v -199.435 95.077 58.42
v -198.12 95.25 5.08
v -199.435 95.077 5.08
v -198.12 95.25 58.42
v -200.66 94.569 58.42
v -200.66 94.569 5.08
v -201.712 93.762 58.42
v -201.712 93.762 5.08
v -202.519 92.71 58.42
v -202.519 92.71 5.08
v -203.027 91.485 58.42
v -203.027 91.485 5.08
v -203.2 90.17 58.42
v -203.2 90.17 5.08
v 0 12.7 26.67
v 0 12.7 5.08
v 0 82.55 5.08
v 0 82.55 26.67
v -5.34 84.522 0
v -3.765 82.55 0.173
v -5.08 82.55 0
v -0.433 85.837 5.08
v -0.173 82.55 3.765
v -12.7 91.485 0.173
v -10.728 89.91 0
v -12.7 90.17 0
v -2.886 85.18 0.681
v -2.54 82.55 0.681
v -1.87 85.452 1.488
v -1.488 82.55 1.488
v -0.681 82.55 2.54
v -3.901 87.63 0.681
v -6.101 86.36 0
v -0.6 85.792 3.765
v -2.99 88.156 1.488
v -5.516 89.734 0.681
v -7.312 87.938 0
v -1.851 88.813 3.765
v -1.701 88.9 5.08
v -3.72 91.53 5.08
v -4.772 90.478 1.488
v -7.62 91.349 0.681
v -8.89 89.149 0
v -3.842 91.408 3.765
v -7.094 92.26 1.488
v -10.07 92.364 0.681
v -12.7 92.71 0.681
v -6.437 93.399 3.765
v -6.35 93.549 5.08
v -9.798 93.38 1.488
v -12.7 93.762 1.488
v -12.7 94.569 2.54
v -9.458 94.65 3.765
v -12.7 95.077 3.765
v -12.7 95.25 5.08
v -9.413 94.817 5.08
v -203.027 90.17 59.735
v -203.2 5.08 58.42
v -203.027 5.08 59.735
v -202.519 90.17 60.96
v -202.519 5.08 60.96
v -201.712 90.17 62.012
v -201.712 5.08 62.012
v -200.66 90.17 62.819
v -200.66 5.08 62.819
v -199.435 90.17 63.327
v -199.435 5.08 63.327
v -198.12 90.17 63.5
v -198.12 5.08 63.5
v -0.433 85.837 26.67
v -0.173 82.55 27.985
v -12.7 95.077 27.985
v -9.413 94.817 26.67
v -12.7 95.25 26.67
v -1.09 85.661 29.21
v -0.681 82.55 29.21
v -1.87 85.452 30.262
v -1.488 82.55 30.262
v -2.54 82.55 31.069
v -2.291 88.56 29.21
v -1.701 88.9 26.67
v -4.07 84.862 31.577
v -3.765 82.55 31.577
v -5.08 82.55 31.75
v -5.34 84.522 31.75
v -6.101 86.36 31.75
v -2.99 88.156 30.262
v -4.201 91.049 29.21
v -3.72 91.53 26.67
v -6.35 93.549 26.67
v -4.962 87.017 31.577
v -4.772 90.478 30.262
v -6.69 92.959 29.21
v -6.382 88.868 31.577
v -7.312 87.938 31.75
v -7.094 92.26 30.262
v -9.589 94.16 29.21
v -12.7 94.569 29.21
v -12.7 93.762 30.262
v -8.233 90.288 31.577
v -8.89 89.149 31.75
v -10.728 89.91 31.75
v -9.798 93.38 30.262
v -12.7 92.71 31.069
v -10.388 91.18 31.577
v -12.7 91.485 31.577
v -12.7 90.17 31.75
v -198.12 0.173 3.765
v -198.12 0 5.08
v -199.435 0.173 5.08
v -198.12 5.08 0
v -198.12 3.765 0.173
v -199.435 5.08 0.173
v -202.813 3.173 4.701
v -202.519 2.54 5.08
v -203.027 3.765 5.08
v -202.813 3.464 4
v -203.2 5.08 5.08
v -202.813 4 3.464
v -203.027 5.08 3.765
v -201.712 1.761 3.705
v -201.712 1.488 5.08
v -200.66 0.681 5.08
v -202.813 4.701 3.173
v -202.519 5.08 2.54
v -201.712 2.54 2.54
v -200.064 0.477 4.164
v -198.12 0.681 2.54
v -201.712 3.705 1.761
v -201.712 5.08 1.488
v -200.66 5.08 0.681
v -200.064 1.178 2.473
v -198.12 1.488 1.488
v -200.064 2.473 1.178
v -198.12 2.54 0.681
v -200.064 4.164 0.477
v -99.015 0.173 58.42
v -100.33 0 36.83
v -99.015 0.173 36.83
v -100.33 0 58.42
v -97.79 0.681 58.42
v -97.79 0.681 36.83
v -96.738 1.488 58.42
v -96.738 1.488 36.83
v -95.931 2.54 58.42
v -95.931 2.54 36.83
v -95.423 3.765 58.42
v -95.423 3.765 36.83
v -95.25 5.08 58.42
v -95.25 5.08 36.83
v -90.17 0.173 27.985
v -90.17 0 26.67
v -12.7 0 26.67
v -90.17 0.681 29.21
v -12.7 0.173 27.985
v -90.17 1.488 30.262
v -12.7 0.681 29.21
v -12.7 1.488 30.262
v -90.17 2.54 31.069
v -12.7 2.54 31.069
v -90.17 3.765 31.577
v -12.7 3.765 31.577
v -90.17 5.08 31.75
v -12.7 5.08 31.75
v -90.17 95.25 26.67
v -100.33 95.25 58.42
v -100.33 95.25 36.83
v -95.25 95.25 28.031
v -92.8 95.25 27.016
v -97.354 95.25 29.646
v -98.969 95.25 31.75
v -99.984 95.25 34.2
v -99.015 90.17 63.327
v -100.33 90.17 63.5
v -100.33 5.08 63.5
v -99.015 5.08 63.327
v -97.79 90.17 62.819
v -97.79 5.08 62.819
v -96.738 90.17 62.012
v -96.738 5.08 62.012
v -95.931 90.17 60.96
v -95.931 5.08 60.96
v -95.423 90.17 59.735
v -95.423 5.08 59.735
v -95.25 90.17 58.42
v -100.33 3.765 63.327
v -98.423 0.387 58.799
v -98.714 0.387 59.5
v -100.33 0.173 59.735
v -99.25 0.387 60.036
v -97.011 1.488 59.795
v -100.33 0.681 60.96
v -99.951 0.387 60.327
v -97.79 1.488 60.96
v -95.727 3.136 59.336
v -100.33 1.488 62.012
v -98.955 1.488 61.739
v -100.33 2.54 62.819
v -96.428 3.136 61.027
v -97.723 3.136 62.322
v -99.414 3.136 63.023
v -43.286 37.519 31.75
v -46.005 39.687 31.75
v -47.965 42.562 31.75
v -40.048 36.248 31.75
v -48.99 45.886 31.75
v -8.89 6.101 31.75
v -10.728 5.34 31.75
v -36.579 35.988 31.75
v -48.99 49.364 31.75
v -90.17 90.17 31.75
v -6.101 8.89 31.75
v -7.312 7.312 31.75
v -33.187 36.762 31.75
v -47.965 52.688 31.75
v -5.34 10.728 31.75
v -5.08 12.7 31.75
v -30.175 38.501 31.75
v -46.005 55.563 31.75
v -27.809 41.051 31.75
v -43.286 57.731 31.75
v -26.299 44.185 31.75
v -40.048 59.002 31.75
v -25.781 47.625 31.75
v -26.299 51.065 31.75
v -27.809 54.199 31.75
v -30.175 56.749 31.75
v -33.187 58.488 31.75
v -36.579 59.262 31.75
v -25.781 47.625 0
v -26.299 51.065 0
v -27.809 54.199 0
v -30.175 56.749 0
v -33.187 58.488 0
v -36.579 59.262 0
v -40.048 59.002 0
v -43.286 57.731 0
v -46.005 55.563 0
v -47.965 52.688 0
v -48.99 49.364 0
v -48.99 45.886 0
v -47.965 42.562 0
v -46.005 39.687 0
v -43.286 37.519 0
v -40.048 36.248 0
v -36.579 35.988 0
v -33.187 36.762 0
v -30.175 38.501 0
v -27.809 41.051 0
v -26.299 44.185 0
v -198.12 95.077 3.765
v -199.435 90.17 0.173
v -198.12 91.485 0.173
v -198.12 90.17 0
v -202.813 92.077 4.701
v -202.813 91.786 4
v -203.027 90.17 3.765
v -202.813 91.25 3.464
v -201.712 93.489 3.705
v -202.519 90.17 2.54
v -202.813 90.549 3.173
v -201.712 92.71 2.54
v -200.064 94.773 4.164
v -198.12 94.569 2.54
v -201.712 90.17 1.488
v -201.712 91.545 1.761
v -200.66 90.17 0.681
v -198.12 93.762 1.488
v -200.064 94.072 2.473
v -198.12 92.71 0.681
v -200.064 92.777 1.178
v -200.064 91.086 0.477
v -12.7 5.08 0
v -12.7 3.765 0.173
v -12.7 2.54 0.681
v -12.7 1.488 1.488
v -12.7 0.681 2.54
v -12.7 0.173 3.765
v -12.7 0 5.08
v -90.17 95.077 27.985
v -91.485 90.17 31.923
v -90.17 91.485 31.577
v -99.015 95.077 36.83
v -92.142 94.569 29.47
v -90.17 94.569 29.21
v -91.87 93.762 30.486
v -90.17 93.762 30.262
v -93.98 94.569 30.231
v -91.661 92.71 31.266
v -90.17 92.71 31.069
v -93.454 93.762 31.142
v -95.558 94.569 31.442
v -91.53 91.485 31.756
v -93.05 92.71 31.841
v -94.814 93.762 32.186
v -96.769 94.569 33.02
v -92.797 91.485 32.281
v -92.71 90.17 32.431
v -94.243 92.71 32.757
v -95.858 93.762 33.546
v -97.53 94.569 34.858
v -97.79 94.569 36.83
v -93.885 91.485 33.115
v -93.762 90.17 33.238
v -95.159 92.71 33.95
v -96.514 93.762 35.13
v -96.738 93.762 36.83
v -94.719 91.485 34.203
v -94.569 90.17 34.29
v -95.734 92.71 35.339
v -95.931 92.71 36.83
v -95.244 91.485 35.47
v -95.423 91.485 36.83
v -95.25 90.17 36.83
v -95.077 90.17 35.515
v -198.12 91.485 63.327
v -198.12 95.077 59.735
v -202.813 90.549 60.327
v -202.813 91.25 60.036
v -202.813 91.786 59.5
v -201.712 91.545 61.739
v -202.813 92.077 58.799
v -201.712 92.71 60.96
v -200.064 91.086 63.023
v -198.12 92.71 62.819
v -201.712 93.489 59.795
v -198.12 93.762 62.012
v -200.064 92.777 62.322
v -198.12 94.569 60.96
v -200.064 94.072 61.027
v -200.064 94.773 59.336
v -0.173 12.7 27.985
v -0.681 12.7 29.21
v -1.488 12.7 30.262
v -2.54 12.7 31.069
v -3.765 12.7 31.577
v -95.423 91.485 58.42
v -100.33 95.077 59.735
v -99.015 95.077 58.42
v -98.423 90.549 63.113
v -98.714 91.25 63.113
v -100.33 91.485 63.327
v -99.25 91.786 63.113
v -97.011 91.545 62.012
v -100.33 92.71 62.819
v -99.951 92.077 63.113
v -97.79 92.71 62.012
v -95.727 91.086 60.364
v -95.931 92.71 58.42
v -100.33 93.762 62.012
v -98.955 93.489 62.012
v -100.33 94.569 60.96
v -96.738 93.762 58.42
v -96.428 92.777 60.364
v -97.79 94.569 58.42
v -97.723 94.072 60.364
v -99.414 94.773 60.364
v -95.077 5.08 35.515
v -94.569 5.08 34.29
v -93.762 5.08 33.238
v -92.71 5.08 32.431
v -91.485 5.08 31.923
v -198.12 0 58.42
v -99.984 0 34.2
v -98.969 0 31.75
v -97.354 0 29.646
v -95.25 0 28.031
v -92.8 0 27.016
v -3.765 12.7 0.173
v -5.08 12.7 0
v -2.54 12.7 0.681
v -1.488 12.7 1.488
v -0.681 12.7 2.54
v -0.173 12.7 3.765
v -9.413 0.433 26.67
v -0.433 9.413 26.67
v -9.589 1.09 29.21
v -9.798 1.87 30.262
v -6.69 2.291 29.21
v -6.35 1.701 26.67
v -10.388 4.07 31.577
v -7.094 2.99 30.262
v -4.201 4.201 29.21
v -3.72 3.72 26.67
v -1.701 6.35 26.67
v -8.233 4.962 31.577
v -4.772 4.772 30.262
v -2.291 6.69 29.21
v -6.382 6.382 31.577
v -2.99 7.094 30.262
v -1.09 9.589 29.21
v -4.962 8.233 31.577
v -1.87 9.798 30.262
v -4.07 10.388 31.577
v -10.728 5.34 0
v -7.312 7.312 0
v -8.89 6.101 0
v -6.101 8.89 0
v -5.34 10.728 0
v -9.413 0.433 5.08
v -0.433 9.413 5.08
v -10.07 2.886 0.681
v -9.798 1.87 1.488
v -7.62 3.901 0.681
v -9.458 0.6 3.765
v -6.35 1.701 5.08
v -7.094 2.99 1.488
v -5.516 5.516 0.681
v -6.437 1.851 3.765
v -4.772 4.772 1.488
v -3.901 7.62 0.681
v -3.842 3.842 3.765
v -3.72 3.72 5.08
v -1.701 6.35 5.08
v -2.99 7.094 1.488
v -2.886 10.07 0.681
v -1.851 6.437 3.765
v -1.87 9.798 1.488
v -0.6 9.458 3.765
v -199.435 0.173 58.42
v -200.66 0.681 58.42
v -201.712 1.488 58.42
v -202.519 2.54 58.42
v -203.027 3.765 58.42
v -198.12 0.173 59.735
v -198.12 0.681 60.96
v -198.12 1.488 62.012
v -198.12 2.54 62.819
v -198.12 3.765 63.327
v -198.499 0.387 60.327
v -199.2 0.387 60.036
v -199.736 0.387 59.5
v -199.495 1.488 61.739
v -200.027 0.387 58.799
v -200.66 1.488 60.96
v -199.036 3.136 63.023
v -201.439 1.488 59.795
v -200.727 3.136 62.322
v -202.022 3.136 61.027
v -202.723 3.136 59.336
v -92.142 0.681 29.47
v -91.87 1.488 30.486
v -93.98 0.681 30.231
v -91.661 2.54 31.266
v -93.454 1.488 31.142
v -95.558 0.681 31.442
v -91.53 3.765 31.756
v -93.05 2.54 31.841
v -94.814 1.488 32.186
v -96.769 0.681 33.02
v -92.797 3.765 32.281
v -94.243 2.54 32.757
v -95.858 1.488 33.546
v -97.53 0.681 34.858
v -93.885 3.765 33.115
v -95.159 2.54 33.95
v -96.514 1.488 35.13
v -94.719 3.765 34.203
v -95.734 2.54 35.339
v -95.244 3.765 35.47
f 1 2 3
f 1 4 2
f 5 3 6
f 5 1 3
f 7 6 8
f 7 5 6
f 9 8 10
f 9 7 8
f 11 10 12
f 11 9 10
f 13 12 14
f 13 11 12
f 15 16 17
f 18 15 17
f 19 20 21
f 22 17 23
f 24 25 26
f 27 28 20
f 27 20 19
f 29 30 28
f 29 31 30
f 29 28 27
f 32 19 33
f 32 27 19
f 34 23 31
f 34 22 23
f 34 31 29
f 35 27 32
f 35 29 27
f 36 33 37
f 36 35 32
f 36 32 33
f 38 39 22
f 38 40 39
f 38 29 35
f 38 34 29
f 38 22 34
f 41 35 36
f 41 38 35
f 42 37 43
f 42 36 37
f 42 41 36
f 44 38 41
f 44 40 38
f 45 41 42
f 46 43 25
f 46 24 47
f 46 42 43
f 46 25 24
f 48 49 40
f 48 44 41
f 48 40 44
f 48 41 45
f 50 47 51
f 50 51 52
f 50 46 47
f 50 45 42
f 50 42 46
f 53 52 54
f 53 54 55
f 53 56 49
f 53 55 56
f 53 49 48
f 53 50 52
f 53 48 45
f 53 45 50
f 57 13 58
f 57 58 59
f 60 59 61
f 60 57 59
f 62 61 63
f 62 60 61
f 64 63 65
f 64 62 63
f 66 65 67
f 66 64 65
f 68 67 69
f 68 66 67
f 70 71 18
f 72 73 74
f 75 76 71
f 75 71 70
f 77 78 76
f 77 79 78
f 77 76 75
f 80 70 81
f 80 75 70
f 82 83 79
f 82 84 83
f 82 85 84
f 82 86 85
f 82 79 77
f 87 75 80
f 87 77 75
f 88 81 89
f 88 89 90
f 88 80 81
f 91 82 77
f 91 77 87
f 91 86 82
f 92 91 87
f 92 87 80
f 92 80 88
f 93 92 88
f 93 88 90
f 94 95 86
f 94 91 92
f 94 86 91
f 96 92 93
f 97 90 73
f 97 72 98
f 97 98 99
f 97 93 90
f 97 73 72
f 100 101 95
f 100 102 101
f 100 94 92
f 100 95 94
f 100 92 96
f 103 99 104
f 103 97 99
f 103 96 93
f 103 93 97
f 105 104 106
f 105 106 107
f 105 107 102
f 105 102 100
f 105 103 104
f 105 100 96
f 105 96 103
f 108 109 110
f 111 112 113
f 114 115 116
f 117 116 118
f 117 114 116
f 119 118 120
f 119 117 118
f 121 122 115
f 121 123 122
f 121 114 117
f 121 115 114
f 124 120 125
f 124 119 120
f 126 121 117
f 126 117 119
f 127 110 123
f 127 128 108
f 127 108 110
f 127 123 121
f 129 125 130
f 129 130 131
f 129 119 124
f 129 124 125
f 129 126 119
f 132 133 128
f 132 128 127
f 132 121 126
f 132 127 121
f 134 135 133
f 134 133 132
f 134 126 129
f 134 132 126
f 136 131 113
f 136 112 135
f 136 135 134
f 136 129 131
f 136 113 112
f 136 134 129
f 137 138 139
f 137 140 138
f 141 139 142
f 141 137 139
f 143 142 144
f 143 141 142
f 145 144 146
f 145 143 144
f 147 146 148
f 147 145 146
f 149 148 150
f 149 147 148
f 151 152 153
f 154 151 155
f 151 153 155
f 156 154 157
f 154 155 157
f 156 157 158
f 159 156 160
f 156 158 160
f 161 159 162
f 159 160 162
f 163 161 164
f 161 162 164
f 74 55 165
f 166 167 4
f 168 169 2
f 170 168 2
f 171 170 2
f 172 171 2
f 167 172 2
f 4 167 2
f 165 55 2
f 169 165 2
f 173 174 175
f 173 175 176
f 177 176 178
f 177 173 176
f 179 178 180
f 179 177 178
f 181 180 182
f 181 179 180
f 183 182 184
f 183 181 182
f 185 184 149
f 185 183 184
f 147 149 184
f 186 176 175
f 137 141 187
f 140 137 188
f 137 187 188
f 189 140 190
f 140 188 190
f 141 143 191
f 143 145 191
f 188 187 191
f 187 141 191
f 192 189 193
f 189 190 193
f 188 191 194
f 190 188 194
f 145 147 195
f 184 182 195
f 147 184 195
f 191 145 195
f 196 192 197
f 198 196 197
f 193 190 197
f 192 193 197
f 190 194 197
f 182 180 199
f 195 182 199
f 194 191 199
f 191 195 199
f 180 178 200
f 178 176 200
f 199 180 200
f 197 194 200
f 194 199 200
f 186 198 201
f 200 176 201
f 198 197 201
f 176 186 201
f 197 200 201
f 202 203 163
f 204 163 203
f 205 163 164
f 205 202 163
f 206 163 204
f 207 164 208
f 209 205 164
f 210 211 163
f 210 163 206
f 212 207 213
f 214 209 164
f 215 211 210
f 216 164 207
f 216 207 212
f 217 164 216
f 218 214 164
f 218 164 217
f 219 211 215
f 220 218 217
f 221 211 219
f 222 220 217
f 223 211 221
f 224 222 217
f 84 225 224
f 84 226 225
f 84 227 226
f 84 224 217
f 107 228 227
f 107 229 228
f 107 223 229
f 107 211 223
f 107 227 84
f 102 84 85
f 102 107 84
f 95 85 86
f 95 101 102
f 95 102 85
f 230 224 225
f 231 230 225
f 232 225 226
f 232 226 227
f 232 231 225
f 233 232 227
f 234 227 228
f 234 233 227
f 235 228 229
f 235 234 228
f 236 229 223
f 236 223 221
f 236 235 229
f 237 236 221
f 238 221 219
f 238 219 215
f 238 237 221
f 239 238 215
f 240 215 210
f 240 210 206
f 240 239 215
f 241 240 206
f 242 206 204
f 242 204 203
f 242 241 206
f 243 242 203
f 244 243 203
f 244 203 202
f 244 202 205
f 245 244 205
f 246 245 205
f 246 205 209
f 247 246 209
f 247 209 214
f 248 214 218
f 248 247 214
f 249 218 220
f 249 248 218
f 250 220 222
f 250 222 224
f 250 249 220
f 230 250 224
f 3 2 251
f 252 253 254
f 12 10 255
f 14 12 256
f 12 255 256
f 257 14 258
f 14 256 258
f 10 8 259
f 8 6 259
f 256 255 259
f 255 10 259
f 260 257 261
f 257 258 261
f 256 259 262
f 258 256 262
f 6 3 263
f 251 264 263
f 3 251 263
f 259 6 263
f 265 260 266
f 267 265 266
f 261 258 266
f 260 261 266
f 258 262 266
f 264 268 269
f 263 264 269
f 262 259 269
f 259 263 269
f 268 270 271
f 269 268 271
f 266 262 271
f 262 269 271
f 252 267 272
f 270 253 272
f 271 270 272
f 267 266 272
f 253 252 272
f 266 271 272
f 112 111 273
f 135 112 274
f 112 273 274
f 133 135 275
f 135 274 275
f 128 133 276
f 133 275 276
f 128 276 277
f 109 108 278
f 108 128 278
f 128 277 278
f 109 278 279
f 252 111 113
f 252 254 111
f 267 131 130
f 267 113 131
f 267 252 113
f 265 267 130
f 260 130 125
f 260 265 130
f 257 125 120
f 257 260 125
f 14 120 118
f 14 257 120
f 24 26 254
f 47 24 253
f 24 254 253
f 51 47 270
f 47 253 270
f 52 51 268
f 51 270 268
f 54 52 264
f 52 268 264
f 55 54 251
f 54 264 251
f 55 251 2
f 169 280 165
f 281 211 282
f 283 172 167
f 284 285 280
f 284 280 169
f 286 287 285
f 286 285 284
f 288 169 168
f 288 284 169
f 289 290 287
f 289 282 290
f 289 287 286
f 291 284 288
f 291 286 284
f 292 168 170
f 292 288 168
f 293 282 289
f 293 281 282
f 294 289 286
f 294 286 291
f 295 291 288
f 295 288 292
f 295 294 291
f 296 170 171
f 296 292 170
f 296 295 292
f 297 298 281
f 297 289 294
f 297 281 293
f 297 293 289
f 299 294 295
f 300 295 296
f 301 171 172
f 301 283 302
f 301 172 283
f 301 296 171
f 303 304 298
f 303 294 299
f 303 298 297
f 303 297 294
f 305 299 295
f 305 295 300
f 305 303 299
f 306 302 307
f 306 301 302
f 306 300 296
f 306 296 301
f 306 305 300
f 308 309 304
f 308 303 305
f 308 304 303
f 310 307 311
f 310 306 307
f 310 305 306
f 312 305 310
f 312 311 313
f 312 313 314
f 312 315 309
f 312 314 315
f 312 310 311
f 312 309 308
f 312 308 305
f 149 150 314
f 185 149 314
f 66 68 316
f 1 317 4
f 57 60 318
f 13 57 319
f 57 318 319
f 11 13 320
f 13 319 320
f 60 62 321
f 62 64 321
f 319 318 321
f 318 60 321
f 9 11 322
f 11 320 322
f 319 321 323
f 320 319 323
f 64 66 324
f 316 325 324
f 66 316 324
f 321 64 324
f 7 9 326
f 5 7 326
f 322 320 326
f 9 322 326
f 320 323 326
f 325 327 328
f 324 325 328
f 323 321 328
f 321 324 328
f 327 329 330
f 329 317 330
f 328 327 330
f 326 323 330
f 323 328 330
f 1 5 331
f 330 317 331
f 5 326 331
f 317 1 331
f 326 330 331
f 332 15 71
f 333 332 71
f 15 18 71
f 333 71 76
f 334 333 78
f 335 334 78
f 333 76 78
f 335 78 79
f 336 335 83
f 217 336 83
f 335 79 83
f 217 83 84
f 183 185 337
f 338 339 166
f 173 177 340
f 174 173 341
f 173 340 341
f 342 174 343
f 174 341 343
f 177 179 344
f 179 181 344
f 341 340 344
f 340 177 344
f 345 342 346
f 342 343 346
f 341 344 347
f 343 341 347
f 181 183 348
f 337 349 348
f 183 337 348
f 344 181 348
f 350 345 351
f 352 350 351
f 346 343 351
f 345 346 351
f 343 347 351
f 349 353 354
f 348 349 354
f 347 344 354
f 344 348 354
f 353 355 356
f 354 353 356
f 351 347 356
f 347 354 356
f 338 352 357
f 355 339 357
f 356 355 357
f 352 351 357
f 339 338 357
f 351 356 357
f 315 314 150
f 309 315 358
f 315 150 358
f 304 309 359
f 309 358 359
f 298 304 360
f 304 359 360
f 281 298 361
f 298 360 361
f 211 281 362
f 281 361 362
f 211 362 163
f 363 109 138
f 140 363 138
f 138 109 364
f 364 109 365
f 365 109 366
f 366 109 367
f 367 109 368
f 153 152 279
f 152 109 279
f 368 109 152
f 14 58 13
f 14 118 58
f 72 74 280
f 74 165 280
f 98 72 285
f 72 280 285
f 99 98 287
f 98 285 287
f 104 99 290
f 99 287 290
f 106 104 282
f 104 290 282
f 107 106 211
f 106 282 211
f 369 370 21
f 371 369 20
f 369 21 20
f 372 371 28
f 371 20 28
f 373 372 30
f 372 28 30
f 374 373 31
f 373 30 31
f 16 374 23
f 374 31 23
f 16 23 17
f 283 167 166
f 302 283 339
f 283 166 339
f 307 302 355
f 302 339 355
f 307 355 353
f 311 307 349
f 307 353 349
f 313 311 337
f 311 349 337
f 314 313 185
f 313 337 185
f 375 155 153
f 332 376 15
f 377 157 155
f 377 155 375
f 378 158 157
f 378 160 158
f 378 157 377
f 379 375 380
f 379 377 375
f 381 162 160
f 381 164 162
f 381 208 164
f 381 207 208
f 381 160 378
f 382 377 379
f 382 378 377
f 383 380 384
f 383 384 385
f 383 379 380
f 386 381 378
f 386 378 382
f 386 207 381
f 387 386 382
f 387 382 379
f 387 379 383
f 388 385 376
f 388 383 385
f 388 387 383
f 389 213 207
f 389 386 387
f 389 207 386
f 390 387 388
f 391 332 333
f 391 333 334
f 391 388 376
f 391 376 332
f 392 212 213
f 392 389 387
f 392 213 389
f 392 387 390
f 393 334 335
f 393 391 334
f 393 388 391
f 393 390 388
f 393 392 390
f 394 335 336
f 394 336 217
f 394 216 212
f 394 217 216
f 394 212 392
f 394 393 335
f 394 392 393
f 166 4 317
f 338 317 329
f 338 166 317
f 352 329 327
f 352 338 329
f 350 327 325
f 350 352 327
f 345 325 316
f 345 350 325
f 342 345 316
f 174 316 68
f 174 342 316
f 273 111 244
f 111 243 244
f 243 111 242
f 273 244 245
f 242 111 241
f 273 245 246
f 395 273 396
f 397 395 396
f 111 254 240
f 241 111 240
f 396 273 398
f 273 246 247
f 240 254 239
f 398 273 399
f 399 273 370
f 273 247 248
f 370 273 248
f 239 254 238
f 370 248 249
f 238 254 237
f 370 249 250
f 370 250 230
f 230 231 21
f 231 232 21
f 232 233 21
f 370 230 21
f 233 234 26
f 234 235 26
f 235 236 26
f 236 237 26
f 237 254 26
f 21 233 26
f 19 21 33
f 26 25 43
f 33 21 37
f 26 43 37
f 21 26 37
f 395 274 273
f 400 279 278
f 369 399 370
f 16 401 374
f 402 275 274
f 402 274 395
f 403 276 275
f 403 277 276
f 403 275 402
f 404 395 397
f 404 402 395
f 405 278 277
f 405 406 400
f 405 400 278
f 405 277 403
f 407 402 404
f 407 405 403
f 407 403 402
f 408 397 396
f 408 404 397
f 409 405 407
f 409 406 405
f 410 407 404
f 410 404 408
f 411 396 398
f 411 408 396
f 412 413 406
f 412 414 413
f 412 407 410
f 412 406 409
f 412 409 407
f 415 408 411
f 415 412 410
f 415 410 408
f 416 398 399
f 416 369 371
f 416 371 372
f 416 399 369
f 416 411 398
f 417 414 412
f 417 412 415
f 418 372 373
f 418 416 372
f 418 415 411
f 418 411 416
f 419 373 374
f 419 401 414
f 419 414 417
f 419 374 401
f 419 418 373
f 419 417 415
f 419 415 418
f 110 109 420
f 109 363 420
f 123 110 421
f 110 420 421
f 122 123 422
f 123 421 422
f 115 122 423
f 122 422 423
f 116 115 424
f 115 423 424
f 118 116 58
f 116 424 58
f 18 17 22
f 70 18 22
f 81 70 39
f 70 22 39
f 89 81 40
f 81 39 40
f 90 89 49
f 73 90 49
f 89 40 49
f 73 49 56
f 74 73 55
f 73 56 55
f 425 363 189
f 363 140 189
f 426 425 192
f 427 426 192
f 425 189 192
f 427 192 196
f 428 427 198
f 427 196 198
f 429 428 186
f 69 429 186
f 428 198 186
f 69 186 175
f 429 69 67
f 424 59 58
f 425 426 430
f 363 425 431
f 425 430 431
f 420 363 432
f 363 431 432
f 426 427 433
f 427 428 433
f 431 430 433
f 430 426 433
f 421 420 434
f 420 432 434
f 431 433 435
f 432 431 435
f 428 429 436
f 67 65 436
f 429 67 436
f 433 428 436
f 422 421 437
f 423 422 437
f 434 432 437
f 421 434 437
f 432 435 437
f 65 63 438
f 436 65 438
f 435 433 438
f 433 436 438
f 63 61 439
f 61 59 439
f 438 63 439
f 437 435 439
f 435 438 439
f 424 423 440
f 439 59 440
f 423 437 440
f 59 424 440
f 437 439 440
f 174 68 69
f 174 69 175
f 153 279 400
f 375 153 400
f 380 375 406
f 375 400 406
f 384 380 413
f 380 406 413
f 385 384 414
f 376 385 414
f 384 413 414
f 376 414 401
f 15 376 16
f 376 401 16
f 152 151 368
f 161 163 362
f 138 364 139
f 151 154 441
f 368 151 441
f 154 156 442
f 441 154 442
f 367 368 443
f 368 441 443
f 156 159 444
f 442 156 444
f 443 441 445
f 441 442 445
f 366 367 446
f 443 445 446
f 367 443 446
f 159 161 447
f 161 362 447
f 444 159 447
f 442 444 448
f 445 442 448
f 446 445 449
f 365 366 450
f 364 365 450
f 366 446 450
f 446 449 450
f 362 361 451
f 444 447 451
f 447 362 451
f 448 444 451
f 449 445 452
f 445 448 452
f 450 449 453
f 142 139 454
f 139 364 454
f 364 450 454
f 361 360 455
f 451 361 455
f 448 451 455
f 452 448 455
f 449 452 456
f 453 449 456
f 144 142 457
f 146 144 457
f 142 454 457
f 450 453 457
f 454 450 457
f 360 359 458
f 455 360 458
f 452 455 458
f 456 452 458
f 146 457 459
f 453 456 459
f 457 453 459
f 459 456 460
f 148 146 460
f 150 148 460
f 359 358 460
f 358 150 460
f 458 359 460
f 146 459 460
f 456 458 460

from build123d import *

# Parameters (mm, degrees)
F0_W      = 107.95
F0_H      = 95.25
F1_DEPTH  = 63.5
F0_R      = 11.66987
F2_DEPTH  = 25.4
F2_FACE_R = 11.66987
F3_DEPTH  = 6.35
F4_R      = 5.08


with BuildPart() as f1:
    # F0 (on Top) → F1 (new body)
    with BuildSketch(Plane.XY):
        with Locations((-149.225, 47.625)):
            Rectangle(F0_W, F0_H)
    extrude(amount=F1_DEPTH)

    # F0 (on Top) → F2 (join)
    with BuildSketch(Plane.XY):
        with BuildLine():
            Line((-12.7, 95.25), (-95.25, 95.25))
            Line((-95.25, 95.25), (-95.25, 0))
            Line((-95.25, 0), (-12.7, 0))
            ThreePointArc((-12.7, 0), (-3.719744, 3.719744), (0, 12.7))
            Line((0, 12.7), (0, 82.55))
            ThreePointArc((0, 82.55), (-3.719744, 91.530256), (-12.7, 95.25))
        make_face()
        with Locations((-37.450853, 47.625)):
            Circle(F0_R, mode=Mode.SUBTRACT)
    extrude(amount=F2_DEPTH)

    # F2_face (on face) → F3 (join)
    with BuildSketch(Plane(origin=(-48.494155, 47.625, 25.4), x_dir=(1, 0, 0), z_dir=(0, 0, 1))):
        with BuildLine():
            Line((35.794155, 47.625), (-46.755845, 47.625))
            Line((-46.755845, 47.625), (-46.755845, -47.625))
            Line((-46.755845, -47.625), (35.794155, -47.625))
            ThreePointArc((35.794155, -47.625), (44.774411, -43.905256), (48.494155, -34.925))
            Line((48.494155, -34.925), (48.494155, 34.925))
            ThreePointArc((48.494155, 34.925), (44.774411, 43.905256), (35.794155, 47.625))
        make_face()
        with Locations((11.043302, 0)):
            Circle(F2_FACE_R, mode=Mode.SUBTRACT)
    extrude(amount=F3_DEPTH)

    # F4
    f4_edges = [f1.edges().sort_by_distance(p)[0] for p in [
        (0, 12.7, 15.875),
        (0, 47.625, 31.75),
        (0, 82.55, 15.875),
        (0, 47.625, 0),
        (-95.25, 95.25, 47.625),
        (-95.25, 47.625, 63.5),
        (-95.25, 0, 47.625),
        (-95.25, 47.625, 31.75),
        (-149.225, 95.25, 63.5),
        (-203.2, 47.625, 63.5),
        (-149.225, 0, 63.5),
        (-203.2, 95.25, 31.75),
        (-203.2, 0, 31.75),
        (-203.2, 47.625, 0),
    ]]
    fillet(f4_edges, radius=F4_R)


solid = f1.part
